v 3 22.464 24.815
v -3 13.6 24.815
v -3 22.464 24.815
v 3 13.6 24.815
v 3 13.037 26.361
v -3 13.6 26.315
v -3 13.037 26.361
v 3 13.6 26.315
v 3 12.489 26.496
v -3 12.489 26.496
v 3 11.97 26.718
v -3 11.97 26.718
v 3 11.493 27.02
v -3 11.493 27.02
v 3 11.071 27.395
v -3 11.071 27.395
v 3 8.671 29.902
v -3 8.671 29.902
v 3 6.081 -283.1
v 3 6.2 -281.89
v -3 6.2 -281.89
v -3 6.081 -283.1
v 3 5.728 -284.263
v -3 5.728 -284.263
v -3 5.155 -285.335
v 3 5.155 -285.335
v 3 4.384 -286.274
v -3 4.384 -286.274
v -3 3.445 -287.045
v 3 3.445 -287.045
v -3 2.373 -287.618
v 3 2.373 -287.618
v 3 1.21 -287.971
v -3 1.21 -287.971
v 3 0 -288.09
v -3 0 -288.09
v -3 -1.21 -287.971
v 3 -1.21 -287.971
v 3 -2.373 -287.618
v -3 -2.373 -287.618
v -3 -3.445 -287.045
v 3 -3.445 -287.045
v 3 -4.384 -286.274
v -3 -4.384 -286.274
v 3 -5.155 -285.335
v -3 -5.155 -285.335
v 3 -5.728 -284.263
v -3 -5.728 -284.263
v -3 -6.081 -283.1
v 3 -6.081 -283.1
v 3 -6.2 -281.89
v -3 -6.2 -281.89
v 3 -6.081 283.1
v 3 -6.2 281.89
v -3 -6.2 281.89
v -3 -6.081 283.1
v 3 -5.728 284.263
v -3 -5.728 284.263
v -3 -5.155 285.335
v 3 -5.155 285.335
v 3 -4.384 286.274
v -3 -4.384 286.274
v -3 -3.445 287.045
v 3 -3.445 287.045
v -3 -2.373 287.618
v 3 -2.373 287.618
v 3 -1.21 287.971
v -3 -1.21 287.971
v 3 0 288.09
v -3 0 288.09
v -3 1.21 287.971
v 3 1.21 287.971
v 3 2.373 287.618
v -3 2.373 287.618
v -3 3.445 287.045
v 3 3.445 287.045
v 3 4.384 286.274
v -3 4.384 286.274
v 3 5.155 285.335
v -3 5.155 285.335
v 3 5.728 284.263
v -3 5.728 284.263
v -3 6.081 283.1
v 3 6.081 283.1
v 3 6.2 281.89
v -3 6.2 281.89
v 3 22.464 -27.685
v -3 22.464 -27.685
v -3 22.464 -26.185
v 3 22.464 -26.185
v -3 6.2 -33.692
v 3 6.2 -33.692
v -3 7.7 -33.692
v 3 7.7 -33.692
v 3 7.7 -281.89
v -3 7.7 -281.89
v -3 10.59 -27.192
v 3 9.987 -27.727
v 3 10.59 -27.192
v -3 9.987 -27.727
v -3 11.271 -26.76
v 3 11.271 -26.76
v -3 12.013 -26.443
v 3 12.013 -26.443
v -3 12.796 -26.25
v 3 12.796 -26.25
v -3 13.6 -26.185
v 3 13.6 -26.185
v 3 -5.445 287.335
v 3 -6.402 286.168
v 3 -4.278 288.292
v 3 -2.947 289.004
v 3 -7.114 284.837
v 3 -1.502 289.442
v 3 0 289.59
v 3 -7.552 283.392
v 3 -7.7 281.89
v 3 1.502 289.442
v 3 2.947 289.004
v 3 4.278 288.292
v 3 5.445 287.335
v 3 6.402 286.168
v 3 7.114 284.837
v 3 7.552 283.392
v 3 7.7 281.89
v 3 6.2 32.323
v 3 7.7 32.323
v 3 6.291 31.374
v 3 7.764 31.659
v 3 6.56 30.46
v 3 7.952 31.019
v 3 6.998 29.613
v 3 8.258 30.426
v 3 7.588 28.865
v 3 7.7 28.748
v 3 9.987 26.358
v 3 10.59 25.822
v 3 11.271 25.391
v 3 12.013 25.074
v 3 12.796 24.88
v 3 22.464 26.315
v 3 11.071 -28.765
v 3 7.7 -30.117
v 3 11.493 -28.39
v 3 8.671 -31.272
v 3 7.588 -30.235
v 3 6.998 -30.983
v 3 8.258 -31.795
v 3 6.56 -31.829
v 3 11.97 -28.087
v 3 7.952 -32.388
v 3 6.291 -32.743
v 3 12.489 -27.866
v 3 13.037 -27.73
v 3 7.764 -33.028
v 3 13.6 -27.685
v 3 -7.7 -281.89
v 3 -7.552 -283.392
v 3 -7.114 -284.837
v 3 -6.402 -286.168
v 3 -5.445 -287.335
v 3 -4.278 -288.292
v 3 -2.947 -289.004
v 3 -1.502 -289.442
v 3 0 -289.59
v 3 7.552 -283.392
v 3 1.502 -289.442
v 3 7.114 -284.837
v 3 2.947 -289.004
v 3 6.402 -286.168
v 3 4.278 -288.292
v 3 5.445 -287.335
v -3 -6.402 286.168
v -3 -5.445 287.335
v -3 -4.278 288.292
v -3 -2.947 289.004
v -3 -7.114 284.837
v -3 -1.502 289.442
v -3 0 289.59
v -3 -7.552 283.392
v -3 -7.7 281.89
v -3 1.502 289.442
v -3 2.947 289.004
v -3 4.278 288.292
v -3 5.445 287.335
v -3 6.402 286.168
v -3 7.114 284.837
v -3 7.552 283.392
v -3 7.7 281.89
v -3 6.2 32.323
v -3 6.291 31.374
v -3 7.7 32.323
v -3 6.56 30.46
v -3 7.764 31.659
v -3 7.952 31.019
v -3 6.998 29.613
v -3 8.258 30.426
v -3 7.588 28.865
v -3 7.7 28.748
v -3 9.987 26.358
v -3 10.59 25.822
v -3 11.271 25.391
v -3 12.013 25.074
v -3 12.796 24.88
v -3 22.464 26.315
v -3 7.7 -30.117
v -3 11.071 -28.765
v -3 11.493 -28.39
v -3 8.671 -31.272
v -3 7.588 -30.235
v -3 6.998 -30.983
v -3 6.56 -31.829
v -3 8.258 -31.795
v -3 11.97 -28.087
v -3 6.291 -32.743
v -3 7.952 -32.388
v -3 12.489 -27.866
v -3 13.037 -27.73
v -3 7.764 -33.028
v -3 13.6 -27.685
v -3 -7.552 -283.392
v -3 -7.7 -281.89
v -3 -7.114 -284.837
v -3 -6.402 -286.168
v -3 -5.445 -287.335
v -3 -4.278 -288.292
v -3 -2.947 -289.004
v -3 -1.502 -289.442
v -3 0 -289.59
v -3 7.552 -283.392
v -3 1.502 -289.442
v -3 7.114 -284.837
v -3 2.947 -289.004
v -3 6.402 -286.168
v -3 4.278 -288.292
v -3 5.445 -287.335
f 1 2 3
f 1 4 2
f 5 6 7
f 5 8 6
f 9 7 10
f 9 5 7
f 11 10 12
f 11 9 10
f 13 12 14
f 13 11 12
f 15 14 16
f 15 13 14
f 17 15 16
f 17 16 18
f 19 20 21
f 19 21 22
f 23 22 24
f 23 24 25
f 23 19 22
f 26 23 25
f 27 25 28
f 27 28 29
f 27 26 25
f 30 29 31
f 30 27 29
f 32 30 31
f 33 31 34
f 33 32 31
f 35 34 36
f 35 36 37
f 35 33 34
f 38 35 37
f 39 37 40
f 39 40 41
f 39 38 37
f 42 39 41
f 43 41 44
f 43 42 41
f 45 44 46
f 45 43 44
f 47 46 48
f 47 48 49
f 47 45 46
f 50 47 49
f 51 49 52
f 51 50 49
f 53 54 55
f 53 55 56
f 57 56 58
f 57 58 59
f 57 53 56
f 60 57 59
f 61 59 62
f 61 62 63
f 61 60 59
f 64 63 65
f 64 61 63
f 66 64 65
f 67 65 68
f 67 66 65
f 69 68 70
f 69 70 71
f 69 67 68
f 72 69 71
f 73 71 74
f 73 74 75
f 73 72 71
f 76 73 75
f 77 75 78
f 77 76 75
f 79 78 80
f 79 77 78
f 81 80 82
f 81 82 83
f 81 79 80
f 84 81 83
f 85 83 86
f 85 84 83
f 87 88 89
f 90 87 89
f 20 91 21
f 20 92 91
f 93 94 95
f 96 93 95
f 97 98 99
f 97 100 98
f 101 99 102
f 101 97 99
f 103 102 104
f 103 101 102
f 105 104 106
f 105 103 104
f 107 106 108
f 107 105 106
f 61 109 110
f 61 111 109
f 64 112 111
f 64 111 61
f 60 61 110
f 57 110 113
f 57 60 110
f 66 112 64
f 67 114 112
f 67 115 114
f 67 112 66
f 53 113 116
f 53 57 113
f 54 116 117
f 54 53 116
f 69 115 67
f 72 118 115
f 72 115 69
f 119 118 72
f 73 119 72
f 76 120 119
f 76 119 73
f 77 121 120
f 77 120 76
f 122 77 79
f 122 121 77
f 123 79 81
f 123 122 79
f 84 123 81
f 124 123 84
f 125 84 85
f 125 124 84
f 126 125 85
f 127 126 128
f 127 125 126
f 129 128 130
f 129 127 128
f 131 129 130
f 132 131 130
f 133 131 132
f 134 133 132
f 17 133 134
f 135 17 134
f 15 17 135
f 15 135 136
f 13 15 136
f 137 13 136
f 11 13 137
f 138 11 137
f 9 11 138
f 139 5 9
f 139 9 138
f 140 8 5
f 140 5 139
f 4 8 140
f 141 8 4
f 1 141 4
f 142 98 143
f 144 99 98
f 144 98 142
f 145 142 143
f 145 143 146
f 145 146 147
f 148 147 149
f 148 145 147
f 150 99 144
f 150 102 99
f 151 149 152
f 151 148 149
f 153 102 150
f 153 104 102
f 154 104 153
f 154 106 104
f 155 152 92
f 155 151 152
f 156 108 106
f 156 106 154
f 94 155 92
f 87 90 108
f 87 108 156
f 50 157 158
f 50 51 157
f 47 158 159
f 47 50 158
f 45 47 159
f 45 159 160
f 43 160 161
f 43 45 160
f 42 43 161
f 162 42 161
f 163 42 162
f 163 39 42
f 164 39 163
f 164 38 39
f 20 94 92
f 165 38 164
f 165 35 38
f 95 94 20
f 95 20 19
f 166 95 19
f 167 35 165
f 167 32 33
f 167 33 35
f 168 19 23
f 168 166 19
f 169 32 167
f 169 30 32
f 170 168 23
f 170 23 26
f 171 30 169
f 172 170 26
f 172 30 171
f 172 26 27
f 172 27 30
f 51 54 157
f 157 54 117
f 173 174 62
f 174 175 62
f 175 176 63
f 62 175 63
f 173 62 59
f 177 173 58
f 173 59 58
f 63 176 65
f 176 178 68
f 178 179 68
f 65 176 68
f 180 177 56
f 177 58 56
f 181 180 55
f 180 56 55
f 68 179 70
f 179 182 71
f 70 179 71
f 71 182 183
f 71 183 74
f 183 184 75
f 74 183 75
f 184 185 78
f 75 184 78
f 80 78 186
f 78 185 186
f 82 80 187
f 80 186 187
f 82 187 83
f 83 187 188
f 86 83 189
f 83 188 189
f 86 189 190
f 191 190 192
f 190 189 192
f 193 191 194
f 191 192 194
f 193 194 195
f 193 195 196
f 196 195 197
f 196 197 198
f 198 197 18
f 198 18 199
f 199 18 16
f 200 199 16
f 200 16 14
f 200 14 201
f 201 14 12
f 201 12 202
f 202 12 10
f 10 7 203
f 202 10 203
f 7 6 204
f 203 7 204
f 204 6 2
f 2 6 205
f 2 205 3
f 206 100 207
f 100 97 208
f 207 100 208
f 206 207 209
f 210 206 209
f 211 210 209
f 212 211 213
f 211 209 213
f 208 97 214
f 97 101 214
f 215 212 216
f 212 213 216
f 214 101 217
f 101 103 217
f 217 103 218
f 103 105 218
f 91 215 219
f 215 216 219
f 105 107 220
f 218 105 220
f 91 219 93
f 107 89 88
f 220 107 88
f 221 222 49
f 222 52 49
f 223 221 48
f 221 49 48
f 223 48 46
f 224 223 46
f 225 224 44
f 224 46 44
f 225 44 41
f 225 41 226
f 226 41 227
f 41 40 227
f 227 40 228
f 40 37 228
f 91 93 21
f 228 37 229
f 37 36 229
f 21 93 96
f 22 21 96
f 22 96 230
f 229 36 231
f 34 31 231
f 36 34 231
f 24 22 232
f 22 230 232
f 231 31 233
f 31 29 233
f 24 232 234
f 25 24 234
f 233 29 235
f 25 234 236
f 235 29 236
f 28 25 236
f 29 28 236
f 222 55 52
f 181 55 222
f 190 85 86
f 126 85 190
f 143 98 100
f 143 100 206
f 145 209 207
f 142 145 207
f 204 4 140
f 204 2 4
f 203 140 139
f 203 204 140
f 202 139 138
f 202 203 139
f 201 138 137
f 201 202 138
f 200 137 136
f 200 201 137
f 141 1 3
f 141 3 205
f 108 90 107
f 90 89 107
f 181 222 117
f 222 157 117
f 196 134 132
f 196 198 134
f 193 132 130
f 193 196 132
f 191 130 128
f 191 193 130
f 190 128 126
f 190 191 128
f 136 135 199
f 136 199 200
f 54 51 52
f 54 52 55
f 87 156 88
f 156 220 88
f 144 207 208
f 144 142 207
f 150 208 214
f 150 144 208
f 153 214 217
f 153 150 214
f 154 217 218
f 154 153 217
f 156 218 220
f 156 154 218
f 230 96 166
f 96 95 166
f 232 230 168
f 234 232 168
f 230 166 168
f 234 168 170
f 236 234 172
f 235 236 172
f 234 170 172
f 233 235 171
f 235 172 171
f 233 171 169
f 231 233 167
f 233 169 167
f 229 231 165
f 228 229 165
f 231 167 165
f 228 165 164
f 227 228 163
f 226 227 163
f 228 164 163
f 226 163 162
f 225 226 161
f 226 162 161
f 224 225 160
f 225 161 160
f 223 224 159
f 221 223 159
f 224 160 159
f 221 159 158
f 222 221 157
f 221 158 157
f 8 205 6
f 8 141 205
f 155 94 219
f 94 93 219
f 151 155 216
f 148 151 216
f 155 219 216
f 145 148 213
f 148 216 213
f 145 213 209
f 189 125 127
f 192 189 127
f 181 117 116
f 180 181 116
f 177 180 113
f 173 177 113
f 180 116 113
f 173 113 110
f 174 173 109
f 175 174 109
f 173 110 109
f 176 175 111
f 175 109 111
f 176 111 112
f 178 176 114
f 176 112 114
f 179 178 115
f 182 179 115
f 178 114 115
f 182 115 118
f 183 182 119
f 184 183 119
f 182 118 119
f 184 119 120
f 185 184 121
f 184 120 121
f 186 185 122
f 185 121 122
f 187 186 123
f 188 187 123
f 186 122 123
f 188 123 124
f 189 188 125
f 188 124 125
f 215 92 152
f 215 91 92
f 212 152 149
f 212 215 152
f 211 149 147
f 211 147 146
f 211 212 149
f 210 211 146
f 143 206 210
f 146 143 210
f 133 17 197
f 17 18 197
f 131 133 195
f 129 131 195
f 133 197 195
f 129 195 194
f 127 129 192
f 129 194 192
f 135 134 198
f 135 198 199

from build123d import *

# Parameters (mm, degrees)
RESSALTO_EXTRUS_O1_DEPTH = 3
BOSS_EXTRUDE1_DEPTH      = 3
CUT_EXTRUDE1_DEPTH       = 291.521948294
FILLET1_R                = 5
FILLET2_R                = 3.5


with BuildPart() as part:
    # Esboço1 → Ressalto-extrusão1 (new, symmetric)
    with BuildSketch(Plane(origin=(0, 0, 0), x_dir=(0, 0, -1), z_dir=(1, 0, 0))):
        with BuildLine():
            Line((-281.89, 7.7), (281.89, 7.7))
            ThreePointArc((281.89, 7.7), (289.59, 0), (281.89, -7.7))
            Line((281.89, -7.7), (-281.89, -7.7))
            ThreePointArc((-281.89, -7.7), (-289.59, 0), (-281.89, 7.7))
        make_face()
        with BuildLine():
            Line((-281.89, 6.2), (281.89, 6.2))
            ThreePointArc((281.89, 6.2), (288.09, 0), (281.89, -6.2))
            Line((281.89, -6.2), (-281.89, -6.2))
            ThreePointArc((-281.89, -6.2), (-288.09, 0), (-281.89, 6.2))
        make_face(mode=Mode.SUBTRACT)
    extrude(amount=RESSALTO_EXTRUS_O1_DEPTH, both=True)

    # Sketch1 → Boss-Extrude1 (add, symmetric)
    with BuildSketch(Plane(origin=(0, 0, 0), x_dir=(0, 0, -1), z_dir=(1, 0, 0))):
        Polygon((26.184631905, 14.464067762), (26.184631905, 11.464067762), (31.684631905, 6.2), (33.854011297, 6.2), (27.684631905, 12.104732939), (27.684631905, 14.464067762), (27.684631905, 22.464067762), (26.184631905, 22.464067762), align=None)
        Polygon((-24.815368095, 11.464067762), (-24.815368095, 14.464067762), (-24.815368095, 22.464067762), (-26.315368095, 22.464067762), (-26.315368095, 14.464067762), (-26.315368095, 12.104732939), (-32.484747486, 6.2), (-30.315368095, 6.2), align=None)
    extrude(amount=BOSS_EXTRUDE1_DEPTH, both=True)

    # Sketch2 → Cut-Extrude1 (cut, through all)
    with BuildSketch(Plane(origin=(3, 0, 0), x_dir=(0, 0, -1), z_dir=(1, 0, 0))):
        Polygon((-30.315368095, 6.2), (-28.748139029, 7.7), (30.117402839, 7.7), (31.684631905, 6.2), align=None)
    extrude(amount=-CUT_EXTRUDE1_DEPTH, mode=Mode.SUBTRACT)

    # Fillet1
    fillet1_edges = [part.edges().sort_by_distance(p)[0] for p in [
        (0, 11.464067762, -26.184631905),
        (0, 6.2, -31.684631905),
        (0, 6.2, 30.315368095),
        (0, 11.464067762, 24.815368095),
    ]]
    fillet(fillet1_edges, radius=FILLET1_R)

    # Fillet2
    fillet2_edges = [part.edges().sort_by_distance(p)[0] for p in [
        (0, 12.104732939, 26.315368095),
        (0, 7.7, 30.917518421),
        (0, 7.7, -32.286782231),
        (0, 12.104732939, -27.684631905),
    ]]
    fillet(fillet2_edges, radius=FILLET2_R)


solid = part.part
